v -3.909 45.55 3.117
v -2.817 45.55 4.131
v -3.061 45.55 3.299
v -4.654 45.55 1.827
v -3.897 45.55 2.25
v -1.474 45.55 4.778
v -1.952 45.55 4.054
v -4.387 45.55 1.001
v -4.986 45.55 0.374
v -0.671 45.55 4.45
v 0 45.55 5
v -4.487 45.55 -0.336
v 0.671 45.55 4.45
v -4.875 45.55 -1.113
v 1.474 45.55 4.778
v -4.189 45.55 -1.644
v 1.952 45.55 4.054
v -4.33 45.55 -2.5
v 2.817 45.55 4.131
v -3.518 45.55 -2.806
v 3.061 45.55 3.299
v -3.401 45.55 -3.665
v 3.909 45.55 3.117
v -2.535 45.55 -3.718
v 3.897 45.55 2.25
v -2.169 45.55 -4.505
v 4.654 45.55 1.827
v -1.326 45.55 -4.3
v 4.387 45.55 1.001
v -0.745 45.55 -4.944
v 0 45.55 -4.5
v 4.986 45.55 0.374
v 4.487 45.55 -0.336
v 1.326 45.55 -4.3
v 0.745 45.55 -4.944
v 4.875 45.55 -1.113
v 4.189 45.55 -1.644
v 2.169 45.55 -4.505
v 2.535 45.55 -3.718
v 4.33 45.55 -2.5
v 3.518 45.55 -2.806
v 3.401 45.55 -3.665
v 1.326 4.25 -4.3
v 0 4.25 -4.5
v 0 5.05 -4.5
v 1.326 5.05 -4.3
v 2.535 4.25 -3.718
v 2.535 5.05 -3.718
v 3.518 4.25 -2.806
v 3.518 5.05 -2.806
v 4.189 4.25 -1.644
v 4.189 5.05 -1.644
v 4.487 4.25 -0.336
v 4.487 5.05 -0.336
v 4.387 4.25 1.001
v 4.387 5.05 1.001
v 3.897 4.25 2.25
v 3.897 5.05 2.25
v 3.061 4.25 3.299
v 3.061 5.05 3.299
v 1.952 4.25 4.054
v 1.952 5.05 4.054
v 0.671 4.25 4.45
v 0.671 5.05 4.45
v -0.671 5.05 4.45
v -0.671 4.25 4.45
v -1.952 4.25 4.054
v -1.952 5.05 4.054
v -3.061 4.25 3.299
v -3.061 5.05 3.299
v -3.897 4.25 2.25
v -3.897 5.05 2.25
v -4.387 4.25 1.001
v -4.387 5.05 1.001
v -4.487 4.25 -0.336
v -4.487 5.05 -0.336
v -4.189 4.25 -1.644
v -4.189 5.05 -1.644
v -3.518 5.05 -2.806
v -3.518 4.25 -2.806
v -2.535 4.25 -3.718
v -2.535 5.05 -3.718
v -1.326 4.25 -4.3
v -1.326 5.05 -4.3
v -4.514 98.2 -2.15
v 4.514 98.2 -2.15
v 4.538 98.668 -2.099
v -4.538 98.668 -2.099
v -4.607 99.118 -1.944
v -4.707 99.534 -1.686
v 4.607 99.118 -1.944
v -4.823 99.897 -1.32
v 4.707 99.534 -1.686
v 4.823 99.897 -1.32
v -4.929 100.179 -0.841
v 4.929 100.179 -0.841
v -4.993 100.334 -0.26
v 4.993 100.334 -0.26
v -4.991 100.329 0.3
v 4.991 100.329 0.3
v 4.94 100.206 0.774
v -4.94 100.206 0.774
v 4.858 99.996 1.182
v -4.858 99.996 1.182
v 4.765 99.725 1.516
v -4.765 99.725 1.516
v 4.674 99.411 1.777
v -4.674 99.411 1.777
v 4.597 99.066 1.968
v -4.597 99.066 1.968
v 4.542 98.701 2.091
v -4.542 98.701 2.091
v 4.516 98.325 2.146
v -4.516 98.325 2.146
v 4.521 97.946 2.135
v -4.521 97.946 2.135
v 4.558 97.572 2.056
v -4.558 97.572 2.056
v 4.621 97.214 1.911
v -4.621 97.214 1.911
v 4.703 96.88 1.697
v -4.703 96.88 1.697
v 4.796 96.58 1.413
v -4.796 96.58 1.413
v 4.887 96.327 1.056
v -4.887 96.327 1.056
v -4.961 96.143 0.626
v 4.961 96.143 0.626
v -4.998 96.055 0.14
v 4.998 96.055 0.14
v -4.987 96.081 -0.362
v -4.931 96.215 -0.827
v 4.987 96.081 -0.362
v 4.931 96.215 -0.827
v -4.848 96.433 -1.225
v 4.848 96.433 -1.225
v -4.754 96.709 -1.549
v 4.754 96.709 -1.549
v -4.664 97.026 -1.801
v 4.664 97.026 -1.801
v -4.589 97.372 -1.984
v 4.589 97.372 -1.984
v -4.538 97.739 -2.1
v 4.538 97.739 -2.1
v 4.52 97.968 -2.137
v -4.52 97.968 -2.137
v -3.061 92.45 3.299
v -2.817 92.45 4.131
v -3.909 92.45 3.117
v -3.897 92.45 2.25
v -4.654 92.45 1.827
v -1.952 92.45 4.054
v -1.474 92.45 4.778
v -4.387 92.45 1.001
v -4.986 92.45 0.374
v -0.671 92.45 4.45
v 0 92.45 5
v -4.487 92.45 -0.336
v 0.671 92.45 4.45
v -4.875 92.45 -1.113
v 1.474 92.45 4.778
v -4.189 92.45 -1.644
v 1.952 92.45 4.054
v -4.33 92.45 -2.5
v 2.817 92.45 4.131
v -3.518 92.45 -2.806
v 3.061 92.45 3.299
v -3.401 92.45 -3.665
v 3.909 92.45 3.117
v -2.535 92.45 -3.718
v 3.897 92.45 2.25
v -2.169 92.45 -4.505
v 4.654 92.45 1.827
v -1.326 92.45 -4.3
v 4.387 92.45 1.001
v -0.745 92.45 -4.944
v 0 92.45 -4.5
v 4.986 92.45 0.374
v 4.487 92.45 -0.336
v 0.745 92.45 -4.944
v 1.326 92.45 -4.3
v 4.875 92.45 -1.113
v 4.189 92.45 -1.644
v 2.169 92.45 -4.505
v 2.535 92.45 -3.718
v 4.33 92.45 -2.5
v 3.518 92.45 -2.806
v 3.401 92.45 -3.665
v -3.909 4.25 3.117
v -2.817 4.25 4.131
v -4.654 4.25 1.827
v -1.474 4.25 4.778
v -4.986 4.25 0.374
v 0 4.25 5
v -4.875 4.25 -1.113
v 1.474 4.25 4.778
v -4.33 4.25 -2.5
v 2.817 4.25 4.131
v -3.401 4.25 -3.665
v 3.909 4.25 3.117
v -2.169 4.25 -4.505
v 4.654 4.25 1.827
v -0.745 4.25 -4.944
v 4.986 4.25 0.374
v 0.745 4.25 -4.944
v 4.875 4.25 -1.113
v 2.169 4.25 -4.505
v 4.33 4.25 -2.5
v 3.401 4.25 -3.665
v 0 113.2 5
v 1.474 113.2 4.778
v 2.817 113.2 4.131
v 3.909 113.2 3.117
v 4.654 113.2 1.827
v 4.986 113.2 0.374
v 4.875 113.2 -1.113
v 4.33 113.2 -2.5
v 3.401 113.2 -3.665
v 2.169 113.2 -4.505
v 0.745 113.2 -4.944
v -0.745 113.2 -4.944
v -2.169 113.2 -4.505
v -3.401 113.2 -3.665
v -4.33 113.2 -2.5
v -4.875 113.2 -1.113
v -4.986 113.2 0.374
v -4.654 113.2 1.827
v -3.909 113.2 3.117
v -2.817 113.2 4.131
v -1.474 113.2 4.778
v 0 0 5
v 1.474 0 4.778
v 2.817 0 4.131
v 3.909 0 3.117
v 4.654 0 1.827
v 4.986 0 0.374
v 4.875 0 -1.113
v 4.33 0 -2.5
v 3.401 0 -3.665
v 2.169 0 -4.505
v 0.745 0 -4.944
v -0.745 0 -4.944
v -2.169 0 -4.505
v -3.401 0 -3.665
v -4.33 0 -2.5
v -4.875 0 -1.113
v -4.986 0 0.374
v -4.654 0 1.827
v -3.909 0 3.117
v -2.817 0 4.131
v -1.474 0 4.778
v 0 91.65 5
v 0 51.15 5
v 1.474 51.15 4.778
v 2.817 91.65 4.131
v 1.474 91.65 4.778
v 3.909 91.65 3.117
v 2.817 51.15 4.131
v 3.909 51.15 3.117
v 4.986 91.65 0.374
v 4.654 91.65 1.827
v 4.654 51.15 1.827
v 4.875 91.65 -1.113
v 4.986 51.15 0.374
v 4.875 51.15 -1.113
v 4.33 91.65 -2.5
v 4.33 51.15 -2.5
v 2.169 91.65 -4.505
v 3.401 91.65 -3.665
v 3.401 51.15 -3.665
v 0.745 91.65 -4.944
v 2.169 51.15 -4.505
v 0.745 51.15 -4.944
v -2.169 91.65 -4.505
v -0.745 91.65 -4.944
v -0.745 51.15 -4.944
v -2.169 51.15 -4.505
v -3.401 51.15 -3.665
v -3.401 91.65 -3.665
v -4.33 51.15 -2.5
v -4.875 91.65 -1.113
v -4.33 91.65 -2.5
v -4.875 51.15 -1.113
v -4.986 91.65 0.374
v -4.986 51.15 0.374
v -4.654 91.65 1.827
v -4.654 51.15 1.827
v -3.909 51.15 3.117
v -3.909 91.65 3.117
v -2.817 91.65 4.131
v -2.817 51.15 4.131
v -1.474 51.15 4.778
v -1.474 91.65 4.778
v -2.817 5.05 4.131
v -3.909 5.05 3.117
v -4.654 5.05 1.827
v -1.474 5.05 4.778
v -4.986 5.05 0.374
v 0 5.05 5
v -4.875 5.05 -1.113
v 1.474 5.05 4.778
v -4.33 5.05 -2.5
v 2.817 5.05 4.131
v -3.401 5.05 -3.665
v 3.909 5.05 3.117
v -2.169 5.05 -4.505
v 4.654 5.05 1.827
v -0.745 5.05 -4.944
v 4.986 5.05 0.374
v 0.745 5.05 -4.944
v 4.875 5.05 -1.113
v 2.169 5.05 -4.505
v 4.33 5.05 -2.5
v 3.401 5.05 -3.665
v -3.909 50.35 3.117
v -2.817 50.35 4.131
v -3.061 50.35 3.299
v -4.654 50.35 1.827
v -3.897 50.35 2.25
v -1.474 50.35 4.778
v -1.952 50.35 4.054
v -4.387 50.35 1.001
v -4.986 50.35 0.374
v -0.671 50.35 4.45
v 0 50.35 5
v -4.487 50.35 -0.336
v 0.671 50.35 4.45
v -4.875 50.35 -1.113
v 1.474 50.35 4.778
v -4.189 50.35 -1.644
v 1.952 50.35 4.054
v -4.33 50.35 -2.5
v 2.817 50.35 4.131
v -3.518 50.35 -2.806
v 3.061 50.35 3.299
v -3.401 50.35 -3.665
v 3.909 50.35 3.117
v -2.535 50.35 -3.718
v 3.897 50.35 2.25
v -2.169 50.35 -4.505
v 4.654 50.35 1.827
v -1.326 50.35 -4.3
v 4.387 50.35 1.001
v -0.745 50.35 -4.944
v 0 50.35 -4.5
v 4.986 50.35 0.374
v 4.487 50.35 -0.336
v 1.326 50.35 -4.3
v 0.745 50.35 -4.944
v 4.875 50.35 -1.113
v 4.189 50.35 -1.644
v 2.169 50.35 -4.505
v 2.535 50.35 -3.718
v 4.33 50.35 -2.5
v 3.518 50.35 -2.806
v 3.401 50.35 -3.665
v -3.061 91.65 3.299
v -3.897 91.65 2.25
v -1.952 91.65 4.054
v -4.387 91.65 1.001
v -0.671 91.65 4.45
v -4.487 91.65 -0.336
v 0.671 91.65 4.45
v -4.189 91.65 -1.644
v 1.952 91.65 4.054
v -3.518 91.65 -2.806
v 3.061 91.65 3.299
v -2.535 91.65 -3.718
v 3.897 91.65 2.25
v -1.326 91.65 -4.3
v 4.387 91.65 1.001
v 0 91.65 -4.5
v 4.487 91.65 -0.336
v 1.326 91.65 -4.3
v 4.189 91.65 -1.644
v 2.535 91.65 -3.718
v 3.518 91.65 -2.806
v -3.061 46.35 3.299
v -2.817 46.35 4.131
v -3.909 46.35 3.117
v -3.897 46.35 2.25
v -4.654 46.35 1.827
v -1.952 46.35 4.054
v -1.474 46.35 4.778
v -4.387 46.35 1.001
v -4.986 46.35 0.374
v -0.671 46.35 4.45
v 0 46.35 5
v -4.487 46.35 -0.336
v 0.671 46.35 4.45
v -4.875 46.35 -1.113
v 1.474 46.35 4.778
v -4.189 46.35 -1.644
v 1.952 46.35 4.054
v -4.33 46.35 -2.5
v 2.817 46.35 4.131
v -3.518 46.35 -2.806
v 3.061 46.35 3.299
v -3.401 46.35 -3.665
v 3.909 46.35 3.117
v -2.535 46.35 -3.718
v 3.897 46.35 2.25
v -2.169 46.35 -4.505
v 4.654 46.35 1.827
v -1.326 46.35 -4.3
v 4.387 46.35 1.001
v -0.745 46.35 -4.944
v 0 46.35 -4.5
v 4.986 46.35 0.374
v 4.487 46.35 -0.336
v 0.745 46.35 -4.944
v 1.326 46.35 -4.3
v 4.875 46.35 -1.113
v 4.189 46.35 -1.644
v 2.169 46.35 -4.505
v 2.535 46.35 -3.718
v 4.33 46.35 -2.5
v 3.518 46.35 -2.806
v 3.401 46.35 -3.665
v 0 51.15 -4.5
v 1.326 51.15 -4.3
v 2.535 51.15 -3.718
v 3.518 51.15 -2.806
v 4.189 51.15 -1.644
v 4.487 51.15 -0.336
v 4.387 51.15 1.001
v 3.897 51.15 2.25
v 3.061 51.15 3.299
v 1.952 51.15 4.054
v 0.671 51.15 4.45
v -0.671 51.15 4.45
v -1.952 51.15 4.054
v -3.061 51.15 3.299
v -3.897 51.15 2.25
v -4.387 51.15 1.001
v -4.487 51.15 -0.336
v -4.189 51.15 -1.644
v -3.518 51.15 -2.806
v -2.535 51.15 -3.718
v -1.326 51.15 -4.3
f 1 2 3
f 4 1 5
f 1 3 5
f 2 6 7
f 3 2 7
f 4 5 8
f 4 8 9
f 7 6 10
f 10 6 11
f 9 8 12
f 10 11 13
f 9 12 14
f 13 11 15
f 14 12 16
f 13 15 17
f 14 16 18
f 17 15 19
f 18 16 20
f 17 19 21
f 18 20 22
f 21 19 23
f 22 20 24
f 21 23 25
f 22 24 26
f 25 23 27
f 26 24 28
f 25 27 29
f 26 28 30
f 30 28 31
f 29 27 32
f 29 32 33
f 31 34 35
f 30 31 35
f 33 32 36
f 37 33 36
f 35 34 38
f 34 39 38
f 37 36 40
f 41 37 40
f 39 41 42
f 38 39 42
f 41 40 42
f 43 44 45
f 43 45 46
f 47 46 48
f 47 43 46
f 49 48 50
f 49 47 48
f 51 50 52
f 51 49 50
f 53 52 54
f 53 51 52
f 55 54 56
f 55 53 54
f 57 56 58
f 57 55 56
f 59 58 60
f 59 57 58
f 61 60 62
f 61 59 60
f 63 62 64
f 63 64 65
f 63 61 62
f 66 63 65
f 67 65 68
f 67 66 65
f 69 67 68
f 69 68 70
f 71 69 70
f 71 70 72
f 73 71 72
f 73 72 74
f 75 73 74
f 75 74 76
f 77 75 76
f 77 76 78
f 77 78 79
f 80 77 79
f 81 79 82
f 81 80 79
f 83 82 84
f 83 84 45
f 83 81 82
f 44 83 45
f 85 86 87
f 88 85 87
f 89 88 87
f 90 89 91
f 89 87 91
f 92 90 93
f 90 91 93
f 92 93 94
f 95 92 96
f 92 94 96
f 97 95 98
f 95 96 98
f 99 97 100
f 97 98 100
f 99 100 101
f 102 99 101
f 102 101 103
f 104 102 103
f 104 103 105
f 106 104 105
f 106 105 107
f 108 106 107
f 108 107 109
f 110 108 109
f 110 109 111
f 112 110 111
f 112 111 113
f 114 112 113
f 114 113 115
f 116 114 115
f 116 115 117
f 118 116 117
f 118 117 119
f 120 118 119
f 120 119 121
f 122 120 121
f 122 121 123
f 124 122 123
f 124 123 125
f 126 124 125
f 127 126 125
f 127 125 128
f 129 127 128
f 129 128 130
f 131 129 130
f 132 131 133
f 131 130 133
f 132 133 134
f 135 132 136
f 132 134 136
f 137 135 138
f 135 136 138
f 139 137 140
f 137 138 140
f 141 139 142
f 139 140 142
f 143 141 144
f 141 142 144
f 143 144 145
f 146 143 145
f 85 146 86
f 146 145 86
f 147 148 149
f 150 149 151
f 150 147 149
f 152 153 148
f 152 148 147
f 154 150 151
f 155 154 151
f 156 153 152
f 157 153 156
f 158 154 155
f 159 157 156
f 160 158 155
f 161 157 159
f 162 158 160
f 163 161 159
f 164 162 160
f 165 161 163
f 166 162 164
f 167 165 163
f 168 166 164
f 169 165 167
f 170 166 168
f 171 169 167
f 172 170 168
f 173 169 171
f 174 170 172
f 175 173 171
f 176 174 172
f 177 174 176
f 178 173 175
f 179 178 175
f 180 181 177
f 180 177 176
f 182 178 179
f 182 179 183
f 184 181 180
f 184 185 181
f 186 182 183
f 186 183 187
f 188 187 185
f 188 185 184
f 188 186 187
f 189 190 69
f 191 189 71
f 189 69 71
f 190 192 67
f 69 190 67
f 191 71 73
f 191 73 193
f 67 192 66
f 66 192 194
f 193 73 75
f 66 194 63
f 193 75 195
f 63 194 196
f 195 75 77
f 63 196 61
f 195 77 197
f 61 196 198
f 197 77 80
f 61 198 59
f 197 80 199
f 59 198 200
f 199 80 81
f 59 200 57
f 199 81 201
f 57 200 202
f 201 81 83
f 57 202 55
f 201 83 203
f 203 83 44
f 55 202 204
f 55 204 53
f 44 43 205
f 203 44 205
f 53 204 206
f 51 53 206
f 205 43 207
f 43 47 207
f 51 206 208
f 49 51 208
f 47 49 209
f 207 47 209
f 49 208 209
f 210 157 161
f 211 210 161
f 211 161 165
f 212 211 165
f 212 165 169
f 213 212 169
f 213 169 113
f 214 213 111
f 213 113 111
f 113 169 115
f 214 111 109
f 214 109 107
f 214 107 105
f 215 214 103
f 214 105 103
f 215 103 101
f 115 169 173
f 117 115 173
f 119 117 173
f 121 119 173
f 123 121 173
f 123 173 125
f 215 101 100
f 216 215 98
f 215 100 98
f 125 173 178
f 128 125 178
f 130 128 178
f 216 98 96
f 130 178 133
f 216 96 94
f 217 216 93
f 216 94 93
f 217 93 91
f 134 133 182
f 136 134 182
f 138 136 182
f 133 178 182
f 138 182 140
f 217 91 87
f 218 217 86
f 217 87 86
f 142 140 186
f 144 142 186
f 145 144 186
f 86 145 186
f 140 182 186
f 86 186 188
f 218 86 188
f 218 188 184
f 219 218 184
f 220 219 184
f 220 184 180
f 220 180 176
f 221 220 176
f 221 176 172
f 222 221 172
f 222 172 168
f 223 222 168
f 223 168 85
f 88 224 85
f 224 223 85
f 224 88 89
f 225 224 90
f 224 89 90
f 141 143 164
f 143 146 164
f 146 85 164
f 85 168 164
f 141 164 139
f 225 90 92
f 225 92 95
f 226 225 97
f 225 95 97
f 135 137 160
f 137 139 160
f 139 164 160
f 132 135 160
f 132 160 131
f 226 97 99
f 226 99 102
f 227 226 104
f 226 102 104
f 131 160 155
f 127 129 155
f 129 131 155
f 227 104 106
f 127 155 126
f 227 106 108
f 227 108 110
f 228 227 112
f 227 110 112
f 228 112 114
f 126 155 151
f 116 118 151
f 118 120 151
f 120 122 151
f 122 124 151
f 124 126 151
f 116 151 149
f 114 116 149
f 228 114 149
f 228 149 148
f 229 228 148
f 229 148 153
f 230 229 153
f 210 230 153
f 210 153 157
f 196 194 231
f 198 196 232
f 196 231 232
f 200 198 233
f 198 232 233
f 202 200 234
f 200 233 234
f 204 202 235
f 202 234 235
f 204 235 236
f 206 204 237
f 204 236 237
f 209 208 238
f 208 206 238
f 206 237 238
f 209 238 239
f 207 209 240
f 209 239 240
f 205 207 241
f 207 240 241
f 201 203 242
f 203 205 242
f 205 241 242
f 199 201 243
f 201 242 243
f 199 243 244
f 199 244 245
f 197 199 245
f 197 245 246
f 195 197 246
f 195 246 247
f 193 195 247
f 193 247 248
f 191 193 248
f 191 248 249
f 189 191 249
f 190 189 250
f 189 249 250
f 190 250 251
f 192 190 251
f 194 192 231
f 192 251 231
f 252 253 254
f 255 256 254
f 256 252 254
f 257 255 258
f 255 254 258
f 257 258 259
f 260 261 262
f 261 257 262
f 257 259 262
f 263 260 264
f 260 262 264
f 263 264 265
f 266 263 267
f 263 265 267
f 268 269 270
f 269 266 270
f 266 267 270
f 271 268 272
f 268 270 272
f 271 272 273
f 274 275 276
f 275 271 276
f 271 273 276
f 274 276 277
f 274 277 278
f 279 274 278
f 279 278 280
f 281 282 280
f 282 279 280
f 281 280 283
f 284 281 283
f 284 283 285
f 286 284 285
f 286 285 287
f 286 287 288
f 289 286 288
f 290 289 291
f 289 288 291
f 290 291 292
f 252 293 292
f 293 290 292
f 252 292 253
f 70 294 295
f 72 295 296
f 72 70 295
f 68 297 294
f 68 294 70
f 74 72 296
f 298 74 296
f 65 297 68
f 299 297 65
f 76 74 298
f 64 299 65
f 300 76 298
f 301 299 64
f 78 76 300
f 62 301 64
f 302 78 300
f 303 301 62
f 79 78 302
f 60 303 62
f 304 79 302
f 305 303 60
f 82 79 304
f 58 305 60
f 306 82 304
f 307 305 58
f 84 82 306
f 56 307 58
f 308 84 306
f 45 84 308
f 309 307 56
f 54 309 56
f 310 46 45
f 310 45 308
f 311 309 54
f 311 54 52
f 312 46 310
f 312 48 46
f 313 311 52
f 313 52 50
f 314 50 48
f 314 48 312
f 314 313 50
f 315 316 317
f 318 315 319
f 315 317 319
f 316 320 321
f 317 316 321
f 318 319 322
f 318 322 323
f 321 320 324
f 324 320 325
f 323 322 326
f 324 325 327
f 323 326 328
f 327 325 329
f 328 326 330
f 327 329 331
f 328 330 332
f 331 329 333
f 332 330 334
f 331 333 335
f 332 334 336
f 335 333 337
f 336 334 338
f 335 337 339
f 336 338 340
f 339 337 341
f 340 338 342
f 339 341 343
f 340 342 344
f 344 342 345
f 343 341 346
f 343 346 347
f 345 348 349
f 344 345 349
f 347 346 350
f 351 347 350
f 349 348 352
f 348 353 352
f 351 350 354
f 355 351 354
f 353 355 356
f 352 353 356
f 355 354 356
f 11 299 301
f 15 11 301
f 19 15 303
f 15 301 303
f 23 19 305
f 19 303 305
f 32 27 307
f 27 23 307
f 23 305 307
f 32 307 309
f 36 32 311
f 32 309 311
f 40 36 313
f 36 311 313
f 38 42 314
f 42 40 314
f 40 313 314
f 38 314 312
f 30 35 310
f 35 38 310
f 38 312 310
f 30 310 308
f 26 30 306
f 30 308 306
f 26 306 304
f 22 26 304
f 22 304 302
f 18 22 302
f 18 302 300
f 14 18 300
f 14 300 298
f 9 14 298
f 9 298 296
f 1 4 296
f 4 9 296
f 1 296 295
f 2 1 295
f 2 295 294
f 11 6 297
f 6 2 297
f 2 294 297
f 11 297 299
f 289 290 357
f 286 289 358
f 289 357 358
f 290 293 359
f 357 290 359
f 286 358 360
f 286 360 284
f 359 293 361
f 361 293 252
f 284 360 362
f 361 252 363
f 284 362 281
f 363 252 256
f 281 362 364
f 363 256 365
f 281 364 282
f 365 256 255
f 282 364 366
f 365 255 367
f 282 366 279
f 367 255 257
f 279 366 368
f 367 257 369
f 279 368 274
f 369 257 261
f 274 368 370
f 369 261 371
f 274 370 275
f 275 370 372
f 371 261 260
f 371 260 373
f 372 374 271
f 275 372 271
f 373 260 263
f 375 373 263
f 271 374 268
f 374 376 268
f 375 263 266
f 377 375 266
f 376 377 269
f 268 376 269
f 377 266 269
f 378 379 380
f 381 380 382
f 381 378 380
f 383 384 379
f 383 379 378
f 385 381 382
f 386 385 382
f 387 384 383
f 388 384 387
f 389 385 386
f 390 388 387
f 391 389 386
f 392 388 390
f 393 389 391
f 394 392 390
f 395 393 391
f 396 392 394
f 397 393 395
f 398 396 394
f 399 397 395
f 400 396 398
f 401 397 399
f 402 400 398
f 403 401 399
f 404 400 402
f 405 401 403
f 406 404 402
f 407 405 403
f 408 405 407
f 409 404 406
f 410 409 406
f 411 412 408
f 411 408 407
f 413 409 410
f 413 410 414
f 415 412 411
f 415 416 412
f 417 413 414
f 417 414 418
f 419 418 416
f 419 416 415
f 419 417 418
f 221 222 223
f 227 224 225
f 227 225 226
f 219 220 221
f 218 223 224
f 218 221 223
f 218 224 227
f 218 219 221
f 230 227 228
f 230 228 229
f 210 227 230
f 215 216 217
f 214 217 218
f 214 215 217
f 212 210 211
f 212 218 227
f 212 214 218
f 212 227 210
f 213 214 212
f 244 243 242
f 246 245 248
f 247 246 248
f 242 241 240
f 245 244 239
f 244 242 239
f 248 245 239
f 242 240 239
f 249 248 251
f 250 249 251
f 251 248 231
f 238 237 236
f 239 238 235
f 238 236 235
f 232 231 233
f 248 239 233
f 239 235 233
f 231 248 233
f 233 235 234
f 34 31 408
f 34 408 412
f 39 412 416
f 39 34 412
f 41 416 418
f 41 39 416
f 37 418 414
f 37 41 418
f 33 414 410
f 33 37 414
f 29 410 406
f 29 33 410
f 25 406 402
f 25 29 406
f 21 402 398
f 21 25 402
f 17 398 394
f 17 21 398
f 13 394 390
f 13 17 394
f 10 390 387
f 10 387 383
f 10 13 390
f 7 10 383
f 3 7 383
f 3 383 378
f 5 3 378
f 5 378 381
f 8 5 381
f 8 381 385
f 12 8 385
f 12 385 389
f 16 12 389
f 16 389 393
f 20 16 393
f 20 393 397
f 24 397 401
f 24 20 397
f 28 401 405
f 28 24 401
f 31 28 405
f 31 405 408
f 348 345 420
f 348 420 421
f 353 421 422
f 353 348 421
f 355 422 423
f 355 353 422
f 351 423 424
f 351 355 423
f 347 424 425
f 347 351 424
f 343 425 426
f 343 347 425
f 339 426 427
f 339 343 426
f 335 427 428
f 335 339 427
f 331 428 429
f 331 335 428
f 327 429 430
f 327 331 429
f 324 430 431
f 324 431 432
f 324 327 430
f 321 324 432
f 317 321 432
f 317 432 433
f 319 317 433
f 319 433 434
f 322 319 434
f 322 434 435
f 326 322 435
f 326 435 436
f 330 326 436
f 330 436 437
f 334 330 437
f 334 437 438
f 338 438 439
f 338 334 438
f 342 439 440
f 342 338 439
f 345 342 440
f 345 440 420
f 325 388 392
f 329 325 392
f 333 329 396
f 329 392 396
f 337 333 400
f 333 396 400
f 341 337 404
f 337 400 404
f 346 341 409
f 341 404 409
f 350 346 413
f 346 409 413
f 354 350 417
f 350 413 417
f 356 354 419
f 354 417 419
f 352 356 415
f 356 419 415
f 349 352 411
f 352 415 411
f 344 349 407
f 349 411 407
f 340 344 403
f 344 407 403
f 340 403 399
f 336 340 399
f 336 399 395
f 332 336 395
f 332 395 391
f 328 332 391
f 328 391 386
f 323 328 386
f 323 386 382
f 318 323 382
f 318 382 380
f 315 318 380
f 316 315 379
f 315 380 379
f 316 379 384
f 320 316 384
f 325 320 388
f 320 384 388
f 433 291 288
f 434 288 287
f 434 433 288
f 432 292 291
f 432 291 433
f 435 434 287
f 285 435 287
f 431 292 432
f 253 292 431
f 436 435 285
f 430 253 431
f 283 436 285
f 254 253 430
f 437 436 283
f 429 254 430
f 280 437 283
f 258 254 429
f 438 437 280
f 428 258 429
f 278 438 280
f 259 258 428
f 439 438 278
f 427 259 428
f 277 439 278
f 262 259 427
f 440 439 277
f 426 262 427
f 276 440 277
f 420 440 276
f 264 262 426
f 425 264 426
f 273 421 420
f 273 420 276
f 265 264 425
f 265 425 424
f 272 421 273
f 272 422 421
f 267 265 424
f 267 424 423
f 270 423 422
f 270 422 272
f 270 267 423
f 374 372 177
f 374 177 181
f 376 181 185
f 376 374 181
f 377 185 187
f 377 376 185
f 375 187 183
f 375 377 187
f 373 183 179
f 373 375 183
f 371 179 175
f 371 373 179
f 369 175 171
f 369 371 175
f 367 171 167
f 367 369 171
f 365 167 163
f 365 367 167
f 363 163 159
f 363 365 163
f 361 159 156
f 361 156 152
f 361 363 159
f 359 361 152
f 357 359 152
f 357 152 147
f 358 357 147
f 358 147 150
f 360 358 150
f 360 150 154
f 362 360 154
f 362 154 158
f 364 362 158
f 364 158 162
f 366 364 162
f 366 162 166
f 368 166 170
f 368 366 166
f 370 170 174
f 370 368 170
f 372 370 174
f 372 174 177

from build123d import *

# Parameters (mm, degrees)
SKETCH1_R            = 5
BOSS_EXTRUDE1_DEPTH  = 113.2
CUT_EXTRUDE2_START   = -4.25
SKETCH2_R            = 5
SKETCH2_R_2          = 4.5
CUT_EXTRUDE2_DEPTH   = 0.8
CUT_EXTRUDE3_START   = -45.55
SKETCH2_2_R          = 5
SKETCH2_2_R_2        = 4.5
CUT_EXTRUDE3_DEPTH   = 0.8
CUT_EXTRUDE4_START   = -50.35
SKETCH2_3_R          = 5
SKETCH2_3_R_2        = 4.5
CUT_EXTRUDE4_DEPTH   = 0.8
CUT_EXTRUDE5_START   = -91.65
SKETCH2_4_R          = 5
SKETCH2_4_R_2        = 4.5
CUT_EXTRUDE5_DEPTH   = 0.8
SKETCH4_R            = 1.5
CUT_EXTRUDE6_DEPTH   = 114.750780217
M4_CLEARANCE_HOLE1_D = 4.3


with BuildPart() as part:
    # Sketch1 → Boss-Extrude1 (new body)
    with BuildSketch(Plane(origin=(0, 0, 0), x_dir=(1, 0, 0), z_dir=(0, 1, 0))):
        Circle(SKETCH1_R)
    extrude(amount=BOSS_EXTRUDE1_DEPTH)

    # Sketch2 → Cut-Extrude2 (cut)
    with BuildSketch(Plane.XZ.offset(CUT_EXTRUDE2_START)):
        Circle(SKETCH2_R)
        Circle(SKETCH2_R_2, mode=Mode.SUBTRACT)
    extrude(amount=-CUT_EXTRUDE2_DEPTH, mode=Mode.SUBTRACT)

    # Sketch2<2> → Cut-Extrude3 (cut)
    with BuildSketch(Plane.XZ.offset(CUT_EXTRUDE3_START)):
        Circle(SKETCH2_2_R)
        Circle(SKETCH2_2_R_2, mode=Mode.SUBTRACT)
    extrude(amount=-CUT_EXTRUDE3_DEPTH, mode=Mode.SUBTRACT)

    # Sketch2<3> → Cut-Extrude4 (cut)
    with BuildSketch(Plane.XZ.offset(CUT_EXTRUDE4_START)):
        Circle(SKETCH2_3_R)
        Circle(SKETCH2_3_R_2, mode=Mode.SUBTRACT)
    extrude(amount=-CUT_EXTRUDE4_DEPTH, mode=Mode.SUBTRACT)

    # Sketch2<4> → Cut-Extrude5 (cut)
    with BuildSketch(Plane.XZ.offset(CUT_EXTRUDE5_START)):
        Circle(SKETCH2_4_R)
        Circle(SKETCH2_4_R_2, mode=Mode.SUBTRACT)
    extrude(amount=-CUT_EXTRUDE5_DEPTH, mode=Mode.SUBTRACT)

    # Sketch4 → Cut-Extrude6 (cut, through all)
    with BuildSketch(Plane(origin=(-5, 0, 0), x_dir=(0, 0, -1), z_dir=(1, 0, 0))):
        with Locations((0, 98.2)):
            Circle(SKETCH4_R)
    extrude(amount=CUT_EXTRUDE6_DEPTH, mode=Mode.SUBTRACT)

    # M4 Clearance Hole1 (through all)
    with Locations(Plane.ZY.offset(5)):
        with Locations((0, 98.2)):
            Hole(M4_CLEARANCE_HOLE1_D / 2)


solid = part.part
